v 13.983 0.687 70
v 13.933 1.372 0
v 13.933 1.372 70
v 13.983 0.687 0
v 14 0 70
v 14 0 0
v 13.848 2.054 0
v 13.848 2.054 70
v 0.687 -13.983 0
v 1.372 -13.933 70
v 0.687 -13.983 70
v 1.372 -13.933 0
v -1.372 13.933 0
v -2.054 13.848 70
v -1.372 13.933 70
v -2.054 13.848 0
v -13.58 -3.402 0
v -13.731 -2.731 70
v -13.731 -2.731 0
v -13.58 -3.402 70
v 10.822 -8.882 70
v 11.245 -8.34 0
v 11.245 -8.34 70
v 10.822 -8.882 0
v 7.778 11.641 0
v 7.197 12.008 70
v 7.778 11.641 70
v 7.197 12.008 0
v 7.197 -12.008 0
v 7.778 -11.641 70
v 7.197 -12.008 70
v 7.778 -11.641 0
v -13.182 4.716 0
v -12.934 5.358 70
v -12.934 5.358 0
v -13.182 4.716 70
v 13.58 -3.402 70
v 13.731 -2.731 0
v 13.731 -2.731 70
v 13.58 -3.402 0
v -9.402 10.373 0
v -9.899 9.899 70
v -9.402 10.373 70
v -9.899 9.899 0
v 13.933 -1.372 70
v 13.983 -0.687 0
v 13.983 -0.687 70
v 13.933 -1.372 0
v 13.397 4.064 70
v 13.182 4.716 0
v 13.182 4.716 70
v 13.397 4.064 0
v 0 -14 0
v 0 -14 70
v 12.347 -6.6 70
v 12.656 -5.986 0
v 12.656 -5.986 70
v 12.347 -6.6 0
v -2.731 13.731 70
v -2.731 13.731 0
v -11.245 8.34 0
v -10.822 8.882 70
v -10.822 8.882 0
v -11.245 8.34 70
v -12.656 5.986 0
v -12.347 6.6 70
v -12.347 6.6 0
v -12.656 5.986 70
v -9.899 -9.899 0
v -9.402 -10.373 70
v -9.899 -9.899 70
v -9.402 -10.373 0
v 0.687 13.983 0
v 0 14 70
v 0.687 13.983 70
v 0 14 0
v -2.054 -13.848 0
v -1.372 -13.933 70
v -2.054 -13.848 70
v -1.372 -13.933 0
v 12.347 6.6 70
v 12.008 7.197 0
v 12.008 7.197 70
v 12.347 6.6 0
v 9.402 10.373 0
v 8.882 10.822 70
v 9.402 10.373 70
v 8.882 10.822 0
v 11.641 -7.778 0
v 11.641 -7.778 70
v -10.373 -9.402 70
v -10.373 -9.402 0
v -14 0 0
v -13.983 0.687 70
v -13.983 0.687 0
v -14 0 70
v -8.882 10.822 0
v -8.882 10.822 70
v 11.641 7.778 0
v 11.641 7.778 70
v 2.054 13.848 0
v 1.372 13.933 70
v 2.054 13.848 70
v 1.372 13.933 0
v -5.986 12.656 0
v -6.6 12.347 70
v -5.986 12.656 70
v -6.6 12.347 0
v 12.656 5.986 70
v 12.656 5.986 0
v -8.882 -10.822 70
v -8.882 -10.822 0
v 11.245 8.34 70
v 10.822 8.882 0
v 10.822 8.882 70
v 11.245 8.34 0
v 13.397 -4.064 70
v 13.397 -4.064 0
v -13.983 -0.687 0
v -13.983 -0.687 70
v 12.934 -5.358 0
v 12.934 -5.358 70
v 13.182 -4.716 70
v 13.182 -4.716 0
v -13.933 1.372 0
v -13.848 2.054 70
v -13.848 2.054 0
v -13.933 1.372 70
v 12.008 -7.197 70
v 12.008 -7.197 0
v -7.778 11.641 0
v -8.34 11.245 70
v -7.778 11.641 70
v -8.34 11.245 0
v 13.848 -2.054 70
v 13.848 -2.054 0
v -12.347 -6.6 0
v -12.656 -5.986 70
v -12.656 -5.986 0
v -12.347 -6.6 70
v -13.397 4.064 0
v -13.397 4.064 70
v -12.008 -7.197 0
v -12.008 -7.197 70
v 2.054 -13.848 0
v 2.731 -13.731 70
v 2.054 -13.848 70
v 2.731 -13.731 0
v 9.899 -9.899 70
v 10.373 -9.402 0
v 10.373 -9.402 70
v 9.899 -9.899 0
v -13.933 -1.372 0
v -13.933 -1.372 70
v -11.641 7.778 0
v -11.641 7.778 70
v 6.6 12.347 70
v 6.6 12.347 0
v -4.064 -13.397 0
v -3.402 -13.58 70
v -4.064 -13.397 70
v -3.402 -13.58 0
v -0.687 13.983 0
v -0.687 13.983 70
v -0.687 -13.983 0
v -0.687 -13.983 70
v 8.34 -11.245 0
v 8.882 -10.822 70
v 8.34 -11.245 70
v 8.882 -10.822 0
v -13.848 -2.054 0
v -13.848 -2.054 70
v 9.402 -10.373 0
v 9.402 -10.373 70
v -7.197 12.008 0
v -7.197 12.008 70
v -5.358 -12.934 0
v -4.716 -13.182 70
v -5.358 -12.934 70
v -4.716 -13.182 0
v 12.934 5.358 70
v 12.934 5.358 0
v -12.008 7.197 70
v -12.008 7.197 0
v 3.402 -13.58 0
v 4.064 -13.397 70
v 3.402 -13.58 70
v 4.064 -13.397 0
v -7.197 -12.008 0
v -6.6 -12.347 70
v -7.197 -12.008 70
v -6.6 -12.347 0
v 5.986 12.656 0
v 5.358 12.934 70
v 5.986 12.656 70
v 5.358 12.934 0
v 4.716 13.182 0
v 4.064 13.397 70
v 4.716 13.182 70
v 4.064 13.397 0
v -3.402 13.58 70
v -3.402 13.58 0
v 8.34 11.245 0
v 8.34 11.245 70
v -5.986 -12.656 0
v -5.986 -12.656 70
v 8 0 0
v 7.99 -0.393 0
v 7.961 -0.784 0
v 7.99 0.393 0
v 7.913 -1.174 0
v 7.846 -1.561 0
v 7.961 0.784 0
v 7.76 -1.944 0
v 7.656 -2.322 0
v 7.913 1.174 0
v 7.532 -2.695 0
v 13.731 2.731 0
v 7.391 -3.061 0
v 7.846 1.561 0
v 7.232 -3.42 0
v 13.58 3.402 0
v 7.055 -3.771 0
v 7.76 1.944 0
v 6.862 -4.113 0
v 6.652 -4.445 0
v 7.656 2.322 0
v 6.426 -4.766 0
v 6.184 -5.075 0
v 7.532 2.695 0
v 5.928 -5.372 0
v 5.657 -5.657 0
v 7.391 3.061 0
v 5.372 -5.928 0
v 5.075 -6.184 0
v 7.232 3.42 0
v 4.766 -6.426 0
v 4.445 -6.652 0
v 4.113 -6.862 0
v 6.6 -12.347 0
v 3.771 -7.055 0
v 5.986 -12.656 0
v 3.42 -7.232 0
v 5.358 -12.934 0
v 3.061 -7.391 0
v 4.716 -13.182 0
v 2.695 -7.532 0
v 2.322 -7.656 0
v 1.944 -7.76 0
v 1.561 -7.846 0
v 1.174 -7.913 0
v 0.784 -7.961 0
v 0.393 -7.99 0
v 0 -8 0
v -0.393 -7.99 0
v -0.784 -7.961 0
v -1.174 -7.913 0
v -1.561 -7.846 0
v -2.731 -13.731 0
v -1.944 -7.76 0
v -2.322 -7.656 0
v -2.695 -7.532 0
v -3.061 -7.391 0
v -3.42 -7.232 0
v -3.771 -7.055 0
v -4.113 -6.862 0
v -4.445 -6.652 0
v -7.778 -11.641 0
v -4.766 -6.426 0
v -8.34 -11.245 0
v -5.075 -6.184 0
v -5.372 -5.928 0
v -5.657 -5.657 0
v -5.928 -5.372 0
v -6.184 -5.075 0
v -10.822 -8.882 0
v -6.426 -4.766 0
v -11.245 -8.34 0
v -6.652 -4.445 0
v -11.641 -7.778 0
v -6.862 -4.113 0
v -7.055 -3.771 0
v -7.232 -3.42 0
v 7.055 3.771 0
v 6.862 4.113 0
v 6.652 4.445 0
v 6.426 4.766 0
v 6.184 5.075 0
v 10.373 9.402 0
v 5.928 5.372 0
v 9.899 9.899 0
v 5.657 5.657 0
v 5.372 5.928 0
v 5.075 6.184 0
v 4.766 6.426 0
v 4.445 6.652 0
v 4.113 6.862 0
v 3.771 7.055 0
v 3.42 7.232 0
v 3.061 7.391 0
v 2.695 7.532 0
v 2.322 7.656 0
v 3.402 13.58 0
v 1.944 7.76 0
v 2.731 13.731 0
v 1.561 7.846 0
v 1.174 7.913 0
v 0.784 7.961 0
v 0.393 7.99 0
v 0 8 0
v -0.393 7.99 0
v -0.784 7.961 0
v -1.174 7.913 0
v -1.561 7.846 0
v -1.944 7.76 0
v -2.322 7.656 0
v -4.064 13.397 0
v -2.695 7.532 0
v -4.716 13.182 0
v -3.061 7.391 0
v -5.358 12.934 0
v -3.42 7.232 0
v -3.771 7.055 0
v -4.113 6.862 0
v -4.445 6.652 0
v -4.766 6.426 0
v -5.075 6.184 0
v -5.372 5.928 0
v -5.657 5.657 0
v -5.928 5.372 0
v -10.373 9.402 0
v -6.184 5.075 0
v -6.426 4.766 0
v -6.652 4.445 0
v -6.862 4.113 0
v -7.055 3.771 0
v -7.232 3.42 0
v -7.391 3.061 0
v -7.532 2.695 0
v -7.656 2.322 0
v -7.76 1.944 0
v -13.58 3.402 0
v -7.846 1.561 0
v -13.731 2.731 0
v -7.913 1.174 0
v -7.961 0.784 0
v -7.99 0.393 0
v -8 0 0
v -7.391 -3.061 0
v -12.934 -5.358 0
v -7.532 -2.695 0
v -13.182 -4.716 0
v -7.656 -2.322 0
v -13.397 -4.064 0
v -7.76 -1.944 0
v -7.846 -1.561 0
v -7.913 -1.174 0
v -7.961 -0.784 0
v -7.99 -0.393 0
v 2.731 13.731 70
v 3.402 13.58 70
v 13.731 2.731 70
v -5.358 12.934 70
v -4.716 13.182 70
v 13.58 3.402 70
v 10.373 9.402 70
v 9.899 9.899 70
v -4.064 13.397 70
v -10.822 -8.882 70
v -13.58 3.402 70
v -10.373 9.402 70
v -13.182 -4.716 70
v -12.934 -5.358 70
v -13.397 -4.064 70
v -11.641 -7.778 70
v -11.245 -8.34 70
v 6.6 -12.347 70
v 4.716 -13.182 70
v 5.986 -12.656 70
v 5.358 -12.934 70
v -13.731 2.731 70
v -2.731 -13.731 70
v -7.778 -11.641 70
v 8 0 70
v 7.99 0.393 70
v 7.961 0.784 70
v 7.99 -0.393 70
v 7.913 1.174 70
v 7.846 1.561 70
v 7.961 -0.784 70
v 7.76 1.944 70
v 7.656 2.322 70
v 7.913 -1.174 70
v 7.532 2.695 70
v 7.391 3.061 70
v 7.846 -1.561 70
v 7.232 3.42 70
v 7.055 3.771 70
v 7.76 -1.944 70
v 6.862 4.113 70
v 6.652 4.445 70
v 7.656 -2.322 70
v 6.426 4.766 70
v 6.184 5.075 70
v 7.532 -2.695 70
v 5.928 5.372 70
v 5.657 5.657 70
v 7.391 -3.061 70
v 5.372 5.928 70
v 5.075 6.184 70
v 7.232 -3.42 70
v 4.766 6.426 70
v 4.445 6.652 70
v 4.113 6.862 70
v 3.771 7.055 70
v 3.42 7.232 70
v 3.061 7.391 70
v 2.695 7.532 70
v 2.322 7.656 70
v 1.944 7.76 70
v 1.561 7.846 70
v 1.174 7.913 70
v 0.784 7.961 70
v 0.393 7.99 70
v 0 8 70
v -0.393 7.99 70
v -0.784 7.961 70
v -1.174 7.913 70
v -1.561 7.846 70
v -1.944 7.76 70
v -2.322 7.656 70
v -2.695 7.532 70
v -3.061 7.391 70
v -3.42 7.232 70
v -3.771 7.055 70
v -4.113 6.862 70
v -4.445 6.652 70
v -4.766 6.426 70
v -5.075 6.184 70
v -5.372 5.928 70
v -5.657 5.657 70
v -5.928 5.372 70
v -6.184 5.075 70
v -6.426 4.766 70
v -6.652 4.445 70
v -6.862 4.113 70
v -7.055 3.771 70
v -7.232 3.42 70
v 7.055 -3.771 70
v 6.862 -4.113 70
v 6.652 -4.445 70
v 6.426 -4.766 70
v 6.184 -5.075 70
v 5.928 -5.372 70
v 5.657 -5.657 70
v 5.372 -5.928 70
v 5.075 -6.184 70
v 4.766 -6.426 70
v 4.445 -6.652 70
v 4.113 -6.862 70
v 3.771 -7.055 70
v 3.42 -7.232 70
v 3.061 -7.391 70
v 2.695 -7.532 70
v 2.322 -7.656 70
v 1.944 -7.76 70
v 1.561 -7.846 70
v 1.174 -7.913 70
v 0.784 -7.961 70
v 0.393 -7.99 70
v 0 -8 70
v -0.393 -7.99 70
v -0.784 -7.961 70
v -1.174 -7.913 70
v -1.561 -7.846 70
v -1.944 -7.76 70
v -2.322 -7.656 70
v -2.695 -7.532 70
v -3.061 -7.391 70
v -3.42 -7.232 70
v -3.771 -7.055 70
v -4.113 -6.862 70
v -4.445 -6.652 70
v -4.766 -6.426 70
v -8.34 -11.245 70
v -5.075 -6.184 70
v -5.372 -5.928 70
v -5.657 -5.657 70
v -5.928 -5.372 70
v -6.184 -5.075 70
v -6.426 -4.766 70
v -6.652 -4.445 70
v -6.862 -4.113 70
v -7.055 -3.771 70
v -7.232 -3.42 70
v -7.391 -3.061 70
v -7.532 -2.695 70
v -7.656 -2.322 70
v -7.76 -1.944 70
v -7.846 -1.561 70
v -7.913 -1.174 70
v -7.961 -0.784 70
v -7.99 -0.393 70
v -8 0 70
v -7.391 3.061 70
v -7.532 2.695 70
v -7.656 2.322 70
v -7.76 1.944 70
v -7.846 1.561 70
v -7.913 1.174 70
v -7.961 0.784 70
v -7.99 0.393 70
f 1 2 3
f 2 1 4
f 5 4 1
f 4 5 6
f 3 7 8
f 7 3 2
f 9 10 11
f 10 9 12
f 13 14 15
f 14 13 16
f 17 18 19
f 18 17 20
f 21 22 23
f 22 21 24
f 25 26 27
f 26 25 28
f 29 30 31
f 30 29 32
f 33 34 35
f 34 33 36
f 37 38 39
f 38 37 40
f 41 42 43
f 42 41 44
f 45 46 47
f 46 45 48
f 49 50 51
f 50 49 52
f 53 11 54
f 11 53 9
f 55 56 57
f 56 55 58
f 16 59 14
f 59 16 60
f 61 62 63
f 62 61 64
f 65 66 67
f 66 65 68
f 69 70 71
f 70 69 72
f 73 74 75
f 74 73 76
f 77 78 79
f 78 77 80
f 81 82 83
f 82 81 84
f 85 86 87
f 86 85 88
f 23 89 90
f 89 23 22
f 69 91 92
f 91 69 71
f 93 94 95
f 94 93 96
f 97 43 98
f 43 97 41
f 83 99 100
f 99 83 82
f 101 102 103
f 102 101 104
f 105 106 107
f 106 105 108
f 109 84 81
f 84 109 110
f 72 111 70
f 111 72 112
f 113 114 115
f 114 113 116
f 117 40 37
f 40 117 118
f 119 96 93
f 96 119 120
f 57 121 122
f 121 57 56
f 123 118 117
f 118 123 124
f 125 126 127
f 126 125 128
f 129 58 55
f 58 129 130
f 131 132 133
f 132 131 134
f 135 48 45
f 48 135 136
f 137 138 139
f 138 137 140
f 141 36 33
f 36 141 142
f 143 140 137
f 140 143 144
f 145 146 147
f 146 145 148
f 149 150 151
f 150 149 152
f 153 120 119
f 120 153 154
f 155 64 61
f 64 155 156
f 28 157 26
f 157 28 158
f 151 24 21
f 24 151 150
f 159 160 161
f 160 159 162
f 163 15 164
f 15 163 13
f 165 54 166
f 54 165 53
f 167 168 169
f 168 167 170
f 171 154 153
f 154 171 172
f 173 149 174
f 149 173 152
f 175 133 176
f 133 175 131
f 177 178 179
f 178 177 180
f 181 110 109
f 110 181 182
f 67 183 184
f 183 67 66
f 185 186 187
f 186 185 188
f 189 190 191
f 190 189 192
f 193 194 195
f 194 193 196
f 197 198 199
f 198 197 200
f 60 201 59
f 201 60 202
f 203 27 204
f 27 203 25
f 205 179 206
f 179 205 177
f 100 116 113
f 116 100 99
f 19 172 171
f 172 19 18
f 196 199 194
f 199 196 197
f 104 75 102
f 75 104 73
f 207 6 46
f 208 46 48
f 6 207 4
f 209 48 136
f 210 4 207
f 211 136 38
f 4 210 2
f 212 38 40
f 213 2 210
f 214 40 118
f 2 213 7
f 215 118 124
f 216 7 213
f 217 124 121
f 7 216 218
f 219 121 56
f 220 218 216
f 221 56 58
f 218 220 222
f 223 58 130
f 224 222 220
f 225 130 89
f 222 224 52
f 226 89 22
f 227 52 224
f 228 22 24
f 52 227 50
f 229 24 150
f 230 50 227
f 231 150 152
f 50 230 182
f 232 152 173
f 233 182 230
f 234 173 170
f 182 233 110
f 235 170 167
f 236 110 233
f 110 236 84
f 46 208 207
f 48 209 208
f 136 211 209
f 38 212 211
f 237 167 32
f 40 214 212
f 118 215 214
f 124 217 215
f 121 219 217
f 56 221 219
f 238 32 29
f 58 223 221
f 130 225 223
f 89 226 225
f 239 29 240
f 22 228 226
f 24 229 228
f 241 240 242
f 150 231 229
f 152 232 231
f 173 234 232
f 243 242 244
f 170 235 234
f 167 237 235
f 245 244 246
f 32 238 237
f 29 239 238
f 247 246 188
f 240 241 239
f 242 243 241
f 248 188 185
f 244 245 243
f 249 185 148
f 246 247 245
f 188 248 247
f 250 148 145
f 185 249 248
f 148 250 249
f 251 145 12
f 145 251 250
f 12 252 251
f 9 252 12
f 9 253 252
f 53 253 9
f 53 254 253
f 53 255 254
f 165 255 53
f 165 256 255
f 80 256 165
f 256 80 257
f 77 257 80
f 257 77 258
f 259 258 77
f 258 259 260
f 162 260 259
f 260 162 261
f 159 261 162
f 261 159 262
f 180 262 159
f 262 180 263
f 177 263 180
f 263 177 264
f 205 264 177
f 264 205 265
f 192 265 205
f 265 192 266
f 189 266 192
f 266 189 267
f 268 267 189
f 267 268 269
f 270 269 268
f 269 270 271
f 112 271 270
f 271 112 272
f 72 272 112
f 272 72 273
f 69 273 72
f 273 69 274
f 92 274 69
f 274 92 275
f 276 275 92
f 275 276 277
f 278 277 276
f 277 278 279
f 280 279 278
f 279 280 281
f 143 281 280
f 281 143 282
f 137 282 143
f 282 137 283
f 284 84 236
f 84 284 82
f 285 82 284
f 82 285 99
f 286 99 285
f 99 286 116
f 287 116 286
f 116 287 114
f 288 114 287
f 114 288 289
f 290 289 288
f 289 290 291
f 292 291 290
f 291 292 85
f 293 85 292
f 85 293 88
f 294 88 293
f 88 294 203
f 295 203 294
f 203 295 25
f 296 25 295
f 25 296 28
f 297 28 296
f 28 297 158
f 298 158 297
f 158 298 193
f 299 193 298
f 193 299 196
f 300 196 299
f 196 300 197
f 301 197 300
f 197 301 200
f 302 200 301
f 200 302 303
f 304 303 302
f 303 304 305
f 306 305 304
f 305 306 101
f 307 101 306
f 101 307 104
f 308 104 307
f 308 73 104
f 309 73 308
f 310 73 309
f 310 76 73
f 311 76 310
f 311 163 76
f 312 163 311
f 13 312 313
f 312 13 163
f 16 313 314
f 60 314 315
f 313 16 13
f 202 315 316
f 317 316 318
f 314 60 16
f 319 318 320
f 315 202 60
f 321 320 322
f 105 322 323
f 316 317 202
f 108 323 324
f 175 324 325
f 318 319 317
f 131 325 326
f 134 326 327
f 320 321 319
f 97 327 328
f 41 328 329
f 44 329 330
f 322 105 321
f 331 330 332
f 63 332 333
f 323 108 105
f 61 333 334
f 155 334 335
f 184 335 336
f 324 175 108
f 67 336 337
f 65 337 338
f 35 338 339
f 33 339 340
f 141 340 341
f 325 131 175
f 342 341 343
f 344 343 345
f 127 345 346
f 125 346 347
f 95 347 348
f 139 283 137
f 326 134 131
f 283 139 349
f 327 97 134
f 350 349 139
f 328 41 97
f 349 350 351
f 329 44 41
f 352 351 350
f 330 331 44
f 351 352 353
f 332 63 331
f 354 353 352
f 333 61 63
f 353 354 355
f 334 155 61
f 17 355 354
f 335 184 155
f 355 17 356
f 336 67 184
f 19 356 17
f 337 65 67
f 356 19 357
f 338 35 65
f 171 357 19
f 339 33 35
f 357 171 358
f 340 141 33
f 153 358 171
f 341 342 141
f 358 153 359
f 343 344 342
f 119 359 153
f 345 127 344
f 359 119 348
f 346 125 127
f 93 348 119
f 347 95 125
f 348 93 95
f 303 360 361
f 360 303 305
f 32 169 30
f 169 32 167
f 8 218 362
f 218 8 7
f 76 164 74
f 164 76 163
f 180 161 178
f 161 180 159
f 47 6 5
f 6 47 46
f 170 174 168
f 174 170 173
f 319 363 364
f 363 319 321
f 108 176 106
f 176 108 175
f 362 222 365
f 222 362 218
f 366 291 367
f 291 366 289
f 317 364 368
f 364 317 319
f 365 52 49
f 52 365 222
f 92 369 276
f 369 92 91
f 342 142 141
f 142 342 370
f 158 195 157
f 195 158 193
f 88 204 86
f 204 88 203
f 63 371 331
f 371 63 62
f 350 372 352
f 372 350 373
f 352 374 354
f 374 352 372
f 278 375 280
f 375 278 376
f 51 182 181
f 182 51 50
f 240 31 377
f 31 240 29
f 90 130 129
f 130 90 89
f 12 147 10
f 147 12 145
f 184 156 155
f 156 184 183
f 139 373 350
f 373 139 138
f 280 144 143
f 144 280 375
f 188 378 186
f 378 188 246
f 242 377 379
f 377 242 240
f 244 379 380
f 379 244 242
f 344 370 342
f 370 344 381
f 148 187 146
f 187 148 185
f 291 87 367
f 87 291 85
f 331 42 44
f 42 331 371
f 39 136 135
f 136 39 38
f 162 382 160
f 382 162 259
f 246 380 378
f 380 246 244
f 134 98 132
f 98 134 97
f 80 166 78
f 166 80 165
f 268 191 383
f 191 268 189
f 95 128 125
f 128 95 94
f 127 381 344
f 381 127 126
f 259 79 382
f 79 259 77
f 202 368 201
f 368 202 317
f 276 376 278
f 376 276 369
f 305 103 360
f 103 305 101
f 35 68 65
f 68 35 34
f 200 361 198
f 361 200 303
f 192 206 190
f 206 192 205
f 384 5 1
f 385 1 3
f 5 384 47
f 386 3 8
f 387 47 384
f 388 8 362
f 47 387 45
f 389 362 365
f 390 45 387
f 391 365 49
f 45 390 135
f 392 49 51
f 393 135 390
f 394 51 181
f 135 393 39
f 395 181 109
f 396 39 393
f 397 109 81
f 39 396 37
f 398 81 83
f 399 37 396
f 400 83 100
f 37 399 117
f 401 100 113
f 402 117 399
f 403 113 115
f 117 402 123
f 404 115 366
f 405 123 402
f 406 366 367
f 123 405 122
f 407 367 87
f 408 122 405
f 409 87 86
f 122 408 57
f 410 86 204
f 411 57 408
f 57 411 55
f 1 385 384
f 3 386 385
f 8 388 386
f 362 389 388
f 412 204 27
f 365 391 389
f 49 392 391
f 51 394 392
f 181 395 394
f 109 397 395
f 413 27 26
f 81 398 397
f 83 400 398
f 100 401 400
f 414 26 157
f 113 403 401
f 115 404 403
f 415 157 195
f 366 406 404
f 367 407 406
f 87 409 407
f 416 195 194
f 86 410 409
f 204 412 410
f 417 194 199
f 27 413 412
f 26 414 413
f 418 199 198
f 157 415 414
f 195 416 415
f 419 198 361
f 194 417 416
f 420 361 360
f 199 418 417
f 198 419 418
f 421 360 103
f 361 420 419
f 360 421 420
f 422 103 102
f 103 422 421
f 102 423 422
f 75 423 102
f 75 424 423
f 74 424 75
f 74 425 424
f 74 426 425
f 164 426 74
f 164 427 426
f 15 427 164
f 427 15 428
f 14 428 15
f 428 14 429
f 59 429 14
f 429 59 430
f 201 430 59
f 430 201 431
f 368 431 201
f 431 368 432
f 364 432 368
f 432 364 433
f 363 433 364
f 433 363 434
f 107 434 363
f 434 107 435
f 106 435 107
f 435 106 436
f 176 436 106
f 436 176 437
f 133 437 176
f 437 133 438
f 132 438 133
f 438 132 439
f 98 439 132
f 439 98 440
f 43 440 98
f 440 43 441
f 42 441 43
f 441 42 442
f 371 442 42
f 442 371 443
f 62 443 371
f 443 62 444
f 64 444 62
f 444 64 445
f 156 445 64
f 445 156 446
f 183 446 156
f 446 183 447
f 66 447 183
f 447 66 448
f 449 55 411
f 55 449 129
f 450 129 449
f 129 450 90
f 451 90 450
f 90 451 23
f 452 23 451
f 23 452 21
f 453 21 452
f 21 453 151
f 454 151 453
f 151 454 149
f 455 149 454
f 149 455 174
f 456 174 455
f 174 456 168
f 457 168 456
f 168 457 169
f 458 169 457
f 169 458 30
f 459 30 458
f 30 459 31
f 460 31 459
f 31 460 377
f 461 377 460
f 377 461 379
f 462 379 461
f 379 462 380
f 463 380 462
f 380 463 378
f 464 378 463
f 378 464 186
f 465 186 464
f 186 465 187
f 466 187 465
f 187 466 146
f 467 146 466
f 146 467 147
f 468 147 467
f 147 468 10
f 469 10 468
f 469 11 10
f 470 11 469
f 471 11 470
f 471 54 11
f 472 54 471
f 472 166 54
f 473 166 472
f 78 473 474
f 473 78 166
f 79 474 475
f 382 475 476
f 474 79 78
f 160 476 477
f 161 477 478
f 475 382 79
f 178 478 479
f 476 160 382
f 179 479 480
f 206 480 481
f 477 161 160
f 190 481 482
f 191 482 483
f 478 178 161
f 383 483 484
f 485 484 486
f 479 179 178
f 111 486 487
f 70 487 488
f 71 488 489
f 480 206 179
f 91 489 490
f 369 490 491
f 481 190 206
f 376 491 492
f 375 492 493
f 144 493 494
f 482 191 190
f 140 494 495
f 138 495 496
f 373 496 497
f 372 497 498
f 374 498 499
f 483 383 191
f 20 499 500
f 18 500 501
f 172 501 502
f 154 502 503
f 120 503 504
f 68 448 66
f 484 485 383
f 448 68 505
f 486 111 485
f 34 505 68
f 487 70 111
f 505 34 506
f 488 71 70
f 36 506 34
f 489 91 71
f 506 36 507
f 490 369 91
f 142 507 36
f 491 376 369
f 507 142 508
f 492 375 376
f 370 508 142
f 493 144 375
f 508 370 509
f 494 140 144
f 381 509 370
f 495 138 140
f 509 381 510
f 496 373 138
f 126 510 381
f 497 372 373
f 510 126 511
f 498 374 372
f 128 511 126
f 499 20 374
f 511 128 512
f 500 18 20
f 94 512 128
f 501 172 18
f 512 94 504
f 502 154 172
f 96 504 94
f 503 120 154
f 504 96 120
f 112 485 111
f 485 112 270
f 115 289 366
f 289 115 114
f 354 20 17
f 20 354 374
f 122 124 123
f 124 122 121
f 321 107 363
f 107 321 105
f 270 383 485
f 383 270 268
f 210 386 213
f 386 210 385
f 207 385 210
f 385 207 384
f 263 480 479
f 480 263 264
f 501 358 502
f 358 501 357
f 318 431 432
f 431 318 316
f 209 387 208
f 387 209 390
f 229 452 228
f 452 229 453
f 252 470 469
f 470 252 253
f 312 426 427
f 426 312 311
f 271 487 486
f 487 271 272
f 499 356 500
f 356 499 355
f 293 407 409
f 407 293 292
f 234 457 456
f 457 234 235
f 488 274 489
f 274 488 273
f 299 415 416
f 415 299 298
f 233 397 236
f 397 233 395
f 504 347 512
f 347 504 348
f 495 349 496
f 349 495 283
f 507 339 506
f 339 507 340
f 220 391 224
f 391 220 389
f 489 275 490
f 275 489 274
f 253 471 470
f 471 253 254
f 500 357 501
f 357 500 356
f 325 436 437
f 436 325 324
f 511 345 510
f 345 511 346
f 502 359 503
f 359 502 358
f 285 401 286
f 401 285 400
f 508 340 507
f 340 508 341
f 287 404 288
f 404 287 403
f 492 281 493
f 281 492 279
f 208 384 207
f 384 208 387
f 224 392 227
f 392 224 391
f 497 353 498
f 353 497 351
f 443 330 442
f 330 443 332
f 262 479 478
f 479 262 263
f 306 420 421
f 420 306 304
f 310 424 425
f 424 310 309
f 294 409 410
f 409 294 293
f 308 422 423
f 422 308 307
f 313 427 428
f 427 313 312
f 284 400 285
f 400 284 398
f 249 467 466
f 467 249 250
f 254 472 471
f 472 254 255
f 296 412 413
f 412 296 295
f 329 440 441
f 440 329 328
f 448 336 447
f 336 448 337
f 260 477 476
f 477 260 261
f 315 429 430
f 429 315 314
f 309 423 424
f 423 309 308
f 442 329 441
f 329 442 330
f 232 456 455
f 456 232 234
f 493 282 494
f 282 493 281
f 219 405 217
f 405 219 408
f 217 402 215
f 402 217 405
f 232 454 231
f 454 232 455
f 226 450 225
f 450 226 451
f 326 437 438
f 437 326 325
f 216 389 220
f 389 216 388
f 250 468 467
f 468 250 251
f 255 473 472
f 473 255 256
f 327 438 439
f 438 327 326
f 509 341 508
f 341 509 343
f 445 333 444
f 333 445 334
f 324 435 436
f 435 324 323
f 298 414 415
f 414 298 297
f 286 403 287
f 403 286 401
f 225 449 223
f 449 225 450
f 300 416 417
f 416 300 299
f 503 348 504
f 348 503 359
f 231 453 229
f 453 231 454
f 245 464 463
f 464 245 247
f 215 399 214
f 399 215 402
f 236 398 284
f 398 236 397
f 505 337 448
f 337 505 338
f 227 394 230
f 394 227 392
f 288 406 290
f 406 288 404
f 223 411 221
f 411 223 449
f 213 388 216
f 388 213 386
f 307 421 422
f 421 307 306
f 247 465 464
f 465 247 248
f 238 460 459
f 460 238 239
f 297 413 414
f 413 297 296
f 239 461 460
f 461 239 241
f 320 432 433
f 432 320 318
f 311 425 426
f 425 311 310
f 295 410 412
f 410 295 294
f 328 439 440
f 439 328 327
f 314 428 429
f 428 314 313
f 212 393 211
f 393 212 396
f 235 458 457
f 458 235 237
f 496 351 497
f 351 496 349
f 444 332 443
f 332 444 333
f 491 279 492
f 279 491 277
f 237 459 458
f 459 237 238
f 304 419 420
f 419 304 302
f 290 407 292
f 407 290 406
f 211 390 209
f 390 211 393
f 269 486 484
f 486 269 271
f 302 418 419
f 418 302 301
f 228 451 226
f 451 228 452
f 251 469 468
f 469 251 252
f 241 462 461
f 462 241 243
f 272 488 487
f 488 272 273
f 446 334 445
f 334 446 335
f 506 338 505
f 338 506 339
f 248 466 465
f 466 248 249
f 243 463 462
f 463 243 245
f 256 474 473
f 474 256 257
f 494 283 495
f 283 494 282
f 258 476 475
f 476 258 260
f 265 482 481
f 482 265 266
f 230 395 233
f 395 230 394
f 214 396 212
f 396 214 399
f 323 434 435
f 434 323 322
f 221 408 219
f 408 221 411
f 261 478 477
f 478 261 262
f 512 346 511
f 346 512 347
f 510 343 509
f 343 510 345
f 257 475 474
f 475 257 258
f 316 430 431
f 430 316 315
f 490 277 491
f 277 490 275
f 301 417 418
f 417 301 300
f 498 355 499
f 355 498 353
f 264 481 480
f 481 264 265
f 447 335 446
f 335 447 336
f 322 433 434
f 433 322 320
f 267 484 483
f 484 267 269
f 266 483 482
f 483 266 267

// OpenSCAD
$fn = 128;

bore_d = 16.0;
outer_d = 28.0;
length = 70.0;

difference() {
  cylinder(d = outer_d, h = length, center = false);
  translate([0, 0, -0.1])
    cylinder(d = bore_d, h = length + 0.2, center = false);
}
